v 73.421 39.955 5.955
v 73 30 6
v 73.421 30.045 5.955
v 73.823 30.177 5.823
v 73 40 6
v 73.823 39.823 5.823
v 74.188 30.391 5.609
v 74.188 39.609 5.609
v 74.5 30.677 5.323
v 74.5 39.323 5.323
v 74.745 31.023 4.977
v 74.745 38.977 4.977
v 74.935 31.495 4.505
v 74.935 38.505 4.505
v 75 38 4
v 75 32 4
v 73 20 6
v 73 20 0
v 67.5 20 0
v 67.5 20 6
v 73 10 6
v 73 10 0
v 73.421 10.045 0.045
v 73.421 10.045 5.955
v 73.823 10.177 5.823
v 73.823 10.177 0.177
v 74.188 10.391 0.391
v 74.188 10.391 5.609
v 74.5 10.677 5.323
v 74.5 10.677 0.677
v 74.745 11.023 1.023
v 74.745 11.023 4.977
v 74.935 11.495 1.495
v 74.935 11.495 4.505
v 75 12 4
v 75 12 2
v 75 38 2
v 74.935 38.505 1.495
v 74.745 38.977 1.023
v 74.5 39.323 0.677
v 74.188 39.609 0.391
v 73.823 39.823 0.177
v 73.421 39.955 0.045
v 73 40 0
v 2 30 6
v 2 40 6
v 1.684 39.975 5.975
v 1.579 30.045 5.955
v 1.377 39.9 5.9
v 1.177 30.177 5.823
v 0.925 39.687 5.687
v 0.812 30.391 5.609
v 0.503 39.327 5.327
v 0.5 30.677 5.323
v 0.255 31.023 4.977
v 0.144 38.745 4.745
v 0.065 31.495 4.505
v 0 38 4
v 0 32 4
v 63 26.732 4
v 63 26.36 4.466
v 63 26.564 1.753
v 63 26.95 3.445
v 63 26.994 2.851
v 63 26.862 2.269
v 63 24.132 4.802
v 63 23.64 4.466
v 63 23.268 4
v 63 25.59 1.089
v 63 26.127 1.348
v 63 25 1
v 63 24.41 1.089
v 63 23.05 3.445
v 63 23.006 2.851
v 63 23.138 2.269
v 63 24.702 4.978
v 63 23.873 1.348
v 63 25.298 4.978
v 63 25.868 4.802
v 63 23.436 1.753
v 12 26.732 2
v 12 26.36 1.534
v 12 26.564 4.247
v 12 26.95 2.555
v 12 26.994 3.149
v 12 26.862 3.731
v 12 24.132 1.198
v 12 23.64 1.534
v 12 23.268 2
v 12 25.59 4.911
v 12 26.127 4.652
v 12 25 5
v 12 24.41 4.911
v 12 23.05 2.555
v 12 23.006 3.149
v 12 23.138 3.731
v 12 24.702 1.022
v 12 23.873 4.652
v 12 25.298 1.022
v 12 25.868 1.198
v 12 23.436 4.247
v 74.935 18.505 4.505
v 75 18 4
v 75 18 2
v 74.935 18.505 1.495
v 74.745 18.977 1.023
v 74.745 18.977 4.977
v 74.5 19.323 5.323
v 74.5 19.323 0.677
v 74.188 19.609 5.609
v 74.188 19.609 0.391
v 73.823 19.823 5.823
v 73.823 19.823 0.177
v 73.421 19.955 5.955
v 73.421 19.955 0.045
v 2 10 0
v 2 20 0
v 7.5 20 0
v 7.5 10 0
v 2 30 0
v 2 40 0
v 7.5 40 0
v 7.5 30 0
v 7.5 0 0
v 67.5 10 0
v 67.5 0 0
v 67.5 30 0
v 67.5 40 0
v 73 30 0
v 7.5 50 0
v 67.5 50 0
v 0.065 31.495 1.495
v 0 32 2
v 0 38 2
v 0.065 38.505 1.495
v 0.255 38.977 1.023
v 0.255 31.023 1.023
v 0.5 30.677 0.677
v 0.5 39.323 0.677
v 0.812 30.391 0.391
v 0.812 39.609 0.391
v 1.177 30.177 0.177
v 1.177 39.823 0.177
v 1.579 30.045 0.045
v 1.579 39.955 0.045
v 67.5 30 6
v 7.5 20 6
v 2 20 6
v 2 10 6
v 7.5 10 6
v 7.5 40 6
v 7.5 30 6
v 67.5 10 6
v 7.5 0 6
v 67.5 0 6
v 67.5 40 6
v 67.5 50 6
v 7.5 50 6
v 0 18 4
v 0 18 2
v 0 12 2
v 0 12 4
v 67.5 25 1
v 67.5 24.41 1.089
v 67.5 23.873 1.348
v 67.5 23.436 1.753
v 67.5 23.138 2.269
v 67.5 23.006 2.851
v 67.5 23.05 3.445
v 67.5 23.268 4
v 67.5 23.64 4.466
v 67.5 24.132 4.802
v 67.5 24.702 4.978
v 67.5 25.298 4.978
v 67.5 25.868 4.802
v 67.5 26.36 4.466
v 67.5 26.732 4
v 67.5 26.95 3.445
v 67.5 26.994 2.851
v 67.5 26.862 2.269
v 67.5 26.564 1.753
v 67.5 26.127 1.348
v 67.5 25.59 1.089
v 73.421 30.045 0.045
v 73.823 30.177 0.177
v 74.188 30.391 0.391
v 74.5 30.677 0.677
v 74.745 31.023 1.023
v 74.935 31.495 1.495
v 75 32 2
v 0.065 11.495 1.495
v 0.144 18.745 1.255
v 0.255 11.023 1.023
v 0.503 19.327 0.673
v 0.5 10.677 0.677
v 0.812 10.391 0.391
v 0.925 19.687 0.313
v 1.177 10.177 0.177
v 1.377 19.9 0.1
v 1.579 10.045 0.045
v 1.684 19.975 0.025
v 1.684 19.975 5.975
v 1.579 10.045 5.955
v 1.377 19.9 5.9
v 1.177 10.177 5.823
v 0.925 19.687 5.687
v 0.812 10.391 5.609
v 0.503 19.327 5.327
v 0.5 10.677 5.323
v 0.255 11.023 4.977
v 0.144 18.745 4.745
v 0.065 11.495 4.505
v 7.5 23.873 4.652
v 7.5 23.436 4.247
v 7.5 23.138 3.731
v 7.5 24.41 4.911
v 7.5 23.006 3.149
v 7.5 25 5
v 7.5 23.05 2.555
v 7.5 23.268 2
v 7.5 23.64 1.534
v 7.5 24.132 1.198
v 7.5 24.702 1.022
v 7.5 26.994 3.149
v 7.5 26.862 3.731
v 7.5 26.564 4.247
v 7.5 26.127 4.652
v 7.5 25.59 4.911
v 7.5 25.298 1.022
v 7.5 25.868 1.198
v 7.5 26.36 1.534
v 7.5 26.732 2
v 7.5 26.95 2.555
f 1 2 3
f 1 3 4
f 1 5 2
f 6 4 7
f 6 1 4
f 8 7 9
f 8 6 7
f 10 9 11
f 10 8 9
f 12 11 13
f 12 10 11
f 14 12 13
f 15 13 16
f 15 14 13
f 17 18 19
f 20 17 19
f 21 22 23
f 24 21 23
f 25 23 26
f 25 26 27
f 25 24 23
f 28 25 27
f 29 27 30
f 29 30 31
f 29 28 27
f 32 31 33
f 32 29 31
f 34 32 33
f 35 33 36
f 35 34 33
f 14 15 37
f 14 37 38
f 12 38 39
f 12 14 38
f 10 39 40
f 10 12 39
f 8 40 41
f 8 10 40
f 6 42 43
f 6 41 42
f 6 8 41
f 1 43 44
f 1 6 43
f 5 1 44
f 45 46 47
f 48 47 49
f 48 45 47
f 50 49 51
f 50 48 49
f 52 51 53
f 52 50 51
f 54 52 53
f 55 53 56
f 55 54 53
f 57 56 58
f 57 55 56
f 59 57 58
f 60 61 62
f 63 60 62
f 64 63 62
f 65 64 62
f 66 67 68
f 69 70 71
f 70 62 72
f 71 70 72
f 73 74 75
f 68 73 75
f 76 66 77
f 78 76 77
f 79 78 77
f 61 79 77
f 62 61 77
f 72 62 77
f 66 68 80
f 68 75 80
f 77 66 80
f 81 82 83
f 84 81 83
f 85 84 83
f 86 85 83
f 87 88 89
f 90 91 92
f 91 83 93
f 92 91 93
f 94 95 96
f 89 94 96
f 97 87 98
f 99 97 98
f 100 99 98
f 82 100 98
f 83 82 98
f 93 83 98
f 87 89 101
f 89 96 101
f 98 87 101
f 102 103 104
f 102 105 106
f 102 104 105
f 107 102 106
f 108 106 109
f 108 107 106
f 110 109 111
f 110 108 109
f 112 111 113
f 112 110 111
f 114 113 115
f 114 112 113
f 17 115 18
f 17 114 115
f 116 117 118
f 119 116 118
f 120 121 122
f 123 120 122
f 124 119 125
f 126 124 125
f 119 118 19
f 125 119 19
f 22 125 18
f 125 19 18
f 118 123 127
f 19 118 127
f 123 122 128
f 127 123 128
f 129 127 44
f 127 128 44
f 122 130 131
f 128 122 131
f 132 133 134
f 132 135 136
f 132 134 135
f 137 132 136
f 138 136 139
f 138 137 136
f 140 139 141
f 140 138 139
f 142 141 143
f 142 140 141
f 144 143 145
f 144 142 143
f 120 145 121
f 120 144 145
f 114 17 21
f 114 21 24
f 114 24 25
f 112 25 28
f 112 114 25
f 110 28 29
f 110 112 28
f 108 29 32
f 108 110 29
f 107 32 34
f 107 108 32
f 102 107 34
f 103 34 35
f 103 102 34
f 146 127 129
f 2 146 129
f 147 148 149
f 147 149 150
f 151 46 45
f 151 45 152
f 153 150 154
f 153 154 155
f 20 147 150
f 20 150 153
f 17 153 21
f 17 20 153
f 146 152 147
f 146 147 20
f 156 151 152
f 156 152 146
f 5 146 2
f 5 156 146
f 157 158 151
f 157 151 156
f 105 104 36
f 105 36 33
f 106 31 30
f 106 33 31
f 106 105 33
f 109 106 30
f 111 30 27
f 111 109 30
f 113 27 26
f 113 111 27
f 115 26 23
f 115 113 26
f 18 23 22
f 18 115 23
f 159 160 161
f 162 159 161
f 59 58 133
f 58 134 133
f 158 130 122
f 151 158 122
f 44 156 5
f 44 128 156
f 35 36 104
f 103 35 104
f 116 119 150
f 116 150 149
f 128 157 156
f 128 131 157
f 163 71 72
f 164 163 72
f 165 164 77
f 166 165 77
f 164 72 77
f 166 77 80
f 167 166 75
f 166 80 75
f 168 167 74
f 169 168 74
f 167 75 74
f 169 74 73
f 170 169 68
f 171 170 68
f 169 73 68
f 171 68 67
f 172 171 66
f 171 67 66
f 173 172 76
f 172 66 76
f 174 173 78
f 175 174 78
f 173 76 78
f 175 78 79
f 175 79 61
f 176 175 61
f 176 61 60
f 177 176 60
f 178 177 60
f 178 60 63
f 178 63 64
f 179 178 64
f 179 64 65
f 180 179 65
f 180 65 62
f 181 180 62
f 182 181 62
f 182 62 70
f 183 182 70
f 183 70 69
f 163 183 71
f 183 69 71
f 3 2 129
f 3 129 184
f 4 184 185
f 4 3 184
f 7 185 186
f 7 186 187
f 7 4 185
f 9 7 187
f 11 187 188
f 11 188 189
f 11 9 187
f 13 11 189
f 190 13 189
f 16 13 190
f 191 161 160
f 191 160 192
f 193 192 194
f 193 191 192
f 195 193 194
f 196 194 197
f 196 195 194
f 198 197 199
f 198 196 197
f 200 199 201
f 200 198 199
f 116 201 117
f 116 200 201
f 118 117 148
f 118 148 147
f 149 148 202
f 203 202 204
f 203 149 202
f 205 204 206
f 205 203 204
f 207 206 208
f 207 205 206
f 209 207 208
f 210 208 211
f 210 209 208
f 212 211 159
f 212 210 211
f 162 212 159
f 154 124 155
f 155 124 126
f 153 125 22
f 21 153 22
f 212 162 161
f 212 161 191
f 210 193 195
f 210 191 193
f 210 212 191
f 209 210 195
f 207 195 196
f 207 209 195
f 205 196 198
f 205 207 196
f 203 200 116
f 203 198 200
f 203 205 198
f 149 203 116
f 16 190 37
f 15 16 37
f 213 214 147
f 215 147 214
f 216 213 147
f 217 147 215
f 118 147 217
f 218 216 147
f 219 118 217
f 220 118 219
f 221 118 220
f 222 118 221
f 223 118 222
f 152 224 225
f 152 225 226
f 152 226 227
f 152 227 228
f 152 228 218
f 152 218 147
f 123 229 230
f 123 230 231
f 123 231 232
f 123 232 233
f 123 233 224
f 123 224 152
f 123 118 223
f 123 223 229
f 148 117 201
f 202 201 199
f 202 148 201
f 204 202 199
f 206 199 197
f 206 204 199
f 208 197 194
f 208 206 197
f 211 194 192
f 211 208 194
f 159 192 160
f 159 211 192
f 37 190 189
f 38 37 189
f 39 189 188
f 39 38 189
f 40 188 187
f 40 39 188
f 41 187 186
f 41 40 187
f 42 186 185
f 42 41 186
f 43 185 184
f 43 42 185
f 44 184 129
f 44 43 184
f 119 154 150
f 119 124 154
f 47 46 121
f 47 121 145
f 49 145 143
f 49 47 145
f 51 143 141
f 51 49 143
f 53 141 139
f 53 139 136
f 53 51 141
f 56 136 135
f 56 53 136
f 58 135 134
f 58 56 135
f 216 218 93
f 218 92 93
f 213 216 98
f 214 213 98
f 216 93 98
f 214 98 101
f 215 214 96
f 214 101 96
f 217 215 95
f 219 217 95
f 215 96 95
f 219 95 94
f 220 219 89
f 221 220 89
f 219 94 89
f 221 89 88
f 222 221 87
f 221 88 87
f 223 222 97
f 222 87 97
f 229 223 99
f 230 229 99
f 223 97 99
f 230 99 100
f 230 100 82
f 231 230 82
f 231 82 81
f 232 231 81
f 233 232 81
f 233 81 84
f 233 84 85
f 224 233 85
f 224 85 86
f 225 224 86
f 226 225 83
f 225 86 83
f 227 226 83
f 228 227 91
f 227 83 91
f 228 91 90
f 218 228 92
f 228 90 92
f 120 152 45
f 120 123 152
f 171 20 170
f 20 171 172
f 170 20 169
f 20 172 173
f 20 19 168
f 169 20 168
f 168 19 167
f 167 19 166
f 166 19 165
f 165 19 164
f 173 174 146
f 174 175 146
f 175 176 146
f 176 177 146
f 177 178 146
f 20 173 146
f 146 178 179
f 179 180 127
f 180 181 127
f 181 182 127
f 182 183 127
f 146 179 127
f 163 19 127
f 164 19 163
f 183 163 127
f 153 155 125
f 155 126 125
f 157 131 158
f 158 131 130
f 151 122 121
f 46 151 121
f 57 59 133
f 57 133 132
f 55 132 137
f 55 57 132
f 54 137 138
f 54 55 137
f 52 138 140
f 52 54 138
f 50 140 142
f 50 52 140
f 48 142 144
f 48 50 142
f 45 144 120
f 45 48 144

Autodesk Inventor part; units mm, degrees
ref_plane "YZ Plane" through (0, 0, 0) normal (1, 0, 0) x (0, 1, 0)
ref_plane "XZ Plane" through (0, 0, 0) normal (0, 1, 0) x (-1, 0, 0)
ref_plane "XY Plane" through (0, 0, 0) normal (0, 0, 1) x (1, 0, 0)
sketch "スケッチ1" plane through (0, 0, 0) normal (0, 0, 1) x (1, 0, 0)
  line L0 (0, 0) -> (75, 0)
  line L1 (75, 0) -> (75, 50)
  line L2 (75, 50) -> (0, 50)
  line L3 (0, 50) -> (0, 0)
  line L4 (0, 50) -> (7.5, 50)
  line L5 (7.5, 50) -> (7.5, 40)
  line L6 (7.5, 40) -> (0, 40)
  line L7 (0, 40) -> (0, 50)
  line L8 (75, 0) -> (0, 0)
  line L9 (0, 0) -> (0, 49.7722)
  line L10 (7.5, 0) -> (7.5, 10)
  line L11 (7.5, 10) -> (0, 10)
  line L12 (75, 0) -> (0, 0)
  line L13 (0, 50) -> (75, 50)
  line L14 (75, 50) -> (75, 0)
  line L15 (75, 50) -> (67.5, 50)
  line L16 (67.5, 50) -> (67.5, 40)
  line L17 (67.5, 40) -> (75, 40)
  line L18 (75, 40) -> (75, 50)
  line L19 (67.5, 0) -> (67.5, 10)
  line L20 (67.5, 10) -> (75, 10)
  line L21 (7.5, 30) -> (0, 30)
  line L22 (0, 30) -> (0, 20)
  line L23 (0, 20) -> (7.5, 20)
  line L24 (7.5, 20) -> (7.5, 30)
  line L25 (75, 50) -> (75, 0)
  line L26 (75, 0) -> (75, 49.7722)
  line L27 (67.5, 30) -> (75, 30)
  line L28 (75, 30) -> (75, 20)
  line L29 (75, 20) -> (67.5, 20)
  line L30 (67.5, 20) -> (67.5, 30)
  dimension "d0" = 75
  dimension "d1" = 50
  dimension "d2" = 7.5
  dimension "d3" = 10
  dimension "d4" = 10
  dimension "d5" = 10
extrude "押し出し1" add sketch "スケッチ1" along normal blind 6 contours L10 L11 L3 L23 L24 L21 L6 L5 L2 L16 L17 L1 L27 L30 L29 L20 L19 L0
sketch "スケッチ2" plane through (7.5, 20, 0) normal (-1, 0, 0) x (0, 0, 1)
  line L0 (0, 10) -> (6, 10) projected
  line L1 (0, 10) -> (0, 0) projected
  point P0 (0, -20)
  point P1 (3, 5)
  dimension "d8" = 5
  dimension "d9" = 3
sketch "スケッチ3" plane through (67.5, 20, 0) normal (1, 0, 0) x (0, 0, -1)
  line L0 (-6, 0) -> (-6, 10) projected
  line L1 (0, 10) -> (-6, 10) projected
  point P0 (0, -20)
  point P1 (-3, 5)
  dimension "d10" = 3
  dimension "d11" = 5
hole "穴1" at (67.5, 25, 3) direction (-1, 0, 0) diameter 4 depth 4.5
hole "穴2" at (7.5, 25, 3) direction (1, 0, 0) diameter 4 depth 4.5
fillet "フィレット1" radius 2 16 edges at (75, 35, 0) (75, 35, 6) (75, 40, 3) (75, 30, 3) (75, 20, 3) (75, 15, 6) (75, 15, 0) (75, 10, 3) (0, 35, 0) (0, 40, 3) (0, 35, 6) (0, 30, 3) (0, 20, 3) (0, 15, 0) (0, 10, 3) (0, 15, 6)
properties part number "menteA"
